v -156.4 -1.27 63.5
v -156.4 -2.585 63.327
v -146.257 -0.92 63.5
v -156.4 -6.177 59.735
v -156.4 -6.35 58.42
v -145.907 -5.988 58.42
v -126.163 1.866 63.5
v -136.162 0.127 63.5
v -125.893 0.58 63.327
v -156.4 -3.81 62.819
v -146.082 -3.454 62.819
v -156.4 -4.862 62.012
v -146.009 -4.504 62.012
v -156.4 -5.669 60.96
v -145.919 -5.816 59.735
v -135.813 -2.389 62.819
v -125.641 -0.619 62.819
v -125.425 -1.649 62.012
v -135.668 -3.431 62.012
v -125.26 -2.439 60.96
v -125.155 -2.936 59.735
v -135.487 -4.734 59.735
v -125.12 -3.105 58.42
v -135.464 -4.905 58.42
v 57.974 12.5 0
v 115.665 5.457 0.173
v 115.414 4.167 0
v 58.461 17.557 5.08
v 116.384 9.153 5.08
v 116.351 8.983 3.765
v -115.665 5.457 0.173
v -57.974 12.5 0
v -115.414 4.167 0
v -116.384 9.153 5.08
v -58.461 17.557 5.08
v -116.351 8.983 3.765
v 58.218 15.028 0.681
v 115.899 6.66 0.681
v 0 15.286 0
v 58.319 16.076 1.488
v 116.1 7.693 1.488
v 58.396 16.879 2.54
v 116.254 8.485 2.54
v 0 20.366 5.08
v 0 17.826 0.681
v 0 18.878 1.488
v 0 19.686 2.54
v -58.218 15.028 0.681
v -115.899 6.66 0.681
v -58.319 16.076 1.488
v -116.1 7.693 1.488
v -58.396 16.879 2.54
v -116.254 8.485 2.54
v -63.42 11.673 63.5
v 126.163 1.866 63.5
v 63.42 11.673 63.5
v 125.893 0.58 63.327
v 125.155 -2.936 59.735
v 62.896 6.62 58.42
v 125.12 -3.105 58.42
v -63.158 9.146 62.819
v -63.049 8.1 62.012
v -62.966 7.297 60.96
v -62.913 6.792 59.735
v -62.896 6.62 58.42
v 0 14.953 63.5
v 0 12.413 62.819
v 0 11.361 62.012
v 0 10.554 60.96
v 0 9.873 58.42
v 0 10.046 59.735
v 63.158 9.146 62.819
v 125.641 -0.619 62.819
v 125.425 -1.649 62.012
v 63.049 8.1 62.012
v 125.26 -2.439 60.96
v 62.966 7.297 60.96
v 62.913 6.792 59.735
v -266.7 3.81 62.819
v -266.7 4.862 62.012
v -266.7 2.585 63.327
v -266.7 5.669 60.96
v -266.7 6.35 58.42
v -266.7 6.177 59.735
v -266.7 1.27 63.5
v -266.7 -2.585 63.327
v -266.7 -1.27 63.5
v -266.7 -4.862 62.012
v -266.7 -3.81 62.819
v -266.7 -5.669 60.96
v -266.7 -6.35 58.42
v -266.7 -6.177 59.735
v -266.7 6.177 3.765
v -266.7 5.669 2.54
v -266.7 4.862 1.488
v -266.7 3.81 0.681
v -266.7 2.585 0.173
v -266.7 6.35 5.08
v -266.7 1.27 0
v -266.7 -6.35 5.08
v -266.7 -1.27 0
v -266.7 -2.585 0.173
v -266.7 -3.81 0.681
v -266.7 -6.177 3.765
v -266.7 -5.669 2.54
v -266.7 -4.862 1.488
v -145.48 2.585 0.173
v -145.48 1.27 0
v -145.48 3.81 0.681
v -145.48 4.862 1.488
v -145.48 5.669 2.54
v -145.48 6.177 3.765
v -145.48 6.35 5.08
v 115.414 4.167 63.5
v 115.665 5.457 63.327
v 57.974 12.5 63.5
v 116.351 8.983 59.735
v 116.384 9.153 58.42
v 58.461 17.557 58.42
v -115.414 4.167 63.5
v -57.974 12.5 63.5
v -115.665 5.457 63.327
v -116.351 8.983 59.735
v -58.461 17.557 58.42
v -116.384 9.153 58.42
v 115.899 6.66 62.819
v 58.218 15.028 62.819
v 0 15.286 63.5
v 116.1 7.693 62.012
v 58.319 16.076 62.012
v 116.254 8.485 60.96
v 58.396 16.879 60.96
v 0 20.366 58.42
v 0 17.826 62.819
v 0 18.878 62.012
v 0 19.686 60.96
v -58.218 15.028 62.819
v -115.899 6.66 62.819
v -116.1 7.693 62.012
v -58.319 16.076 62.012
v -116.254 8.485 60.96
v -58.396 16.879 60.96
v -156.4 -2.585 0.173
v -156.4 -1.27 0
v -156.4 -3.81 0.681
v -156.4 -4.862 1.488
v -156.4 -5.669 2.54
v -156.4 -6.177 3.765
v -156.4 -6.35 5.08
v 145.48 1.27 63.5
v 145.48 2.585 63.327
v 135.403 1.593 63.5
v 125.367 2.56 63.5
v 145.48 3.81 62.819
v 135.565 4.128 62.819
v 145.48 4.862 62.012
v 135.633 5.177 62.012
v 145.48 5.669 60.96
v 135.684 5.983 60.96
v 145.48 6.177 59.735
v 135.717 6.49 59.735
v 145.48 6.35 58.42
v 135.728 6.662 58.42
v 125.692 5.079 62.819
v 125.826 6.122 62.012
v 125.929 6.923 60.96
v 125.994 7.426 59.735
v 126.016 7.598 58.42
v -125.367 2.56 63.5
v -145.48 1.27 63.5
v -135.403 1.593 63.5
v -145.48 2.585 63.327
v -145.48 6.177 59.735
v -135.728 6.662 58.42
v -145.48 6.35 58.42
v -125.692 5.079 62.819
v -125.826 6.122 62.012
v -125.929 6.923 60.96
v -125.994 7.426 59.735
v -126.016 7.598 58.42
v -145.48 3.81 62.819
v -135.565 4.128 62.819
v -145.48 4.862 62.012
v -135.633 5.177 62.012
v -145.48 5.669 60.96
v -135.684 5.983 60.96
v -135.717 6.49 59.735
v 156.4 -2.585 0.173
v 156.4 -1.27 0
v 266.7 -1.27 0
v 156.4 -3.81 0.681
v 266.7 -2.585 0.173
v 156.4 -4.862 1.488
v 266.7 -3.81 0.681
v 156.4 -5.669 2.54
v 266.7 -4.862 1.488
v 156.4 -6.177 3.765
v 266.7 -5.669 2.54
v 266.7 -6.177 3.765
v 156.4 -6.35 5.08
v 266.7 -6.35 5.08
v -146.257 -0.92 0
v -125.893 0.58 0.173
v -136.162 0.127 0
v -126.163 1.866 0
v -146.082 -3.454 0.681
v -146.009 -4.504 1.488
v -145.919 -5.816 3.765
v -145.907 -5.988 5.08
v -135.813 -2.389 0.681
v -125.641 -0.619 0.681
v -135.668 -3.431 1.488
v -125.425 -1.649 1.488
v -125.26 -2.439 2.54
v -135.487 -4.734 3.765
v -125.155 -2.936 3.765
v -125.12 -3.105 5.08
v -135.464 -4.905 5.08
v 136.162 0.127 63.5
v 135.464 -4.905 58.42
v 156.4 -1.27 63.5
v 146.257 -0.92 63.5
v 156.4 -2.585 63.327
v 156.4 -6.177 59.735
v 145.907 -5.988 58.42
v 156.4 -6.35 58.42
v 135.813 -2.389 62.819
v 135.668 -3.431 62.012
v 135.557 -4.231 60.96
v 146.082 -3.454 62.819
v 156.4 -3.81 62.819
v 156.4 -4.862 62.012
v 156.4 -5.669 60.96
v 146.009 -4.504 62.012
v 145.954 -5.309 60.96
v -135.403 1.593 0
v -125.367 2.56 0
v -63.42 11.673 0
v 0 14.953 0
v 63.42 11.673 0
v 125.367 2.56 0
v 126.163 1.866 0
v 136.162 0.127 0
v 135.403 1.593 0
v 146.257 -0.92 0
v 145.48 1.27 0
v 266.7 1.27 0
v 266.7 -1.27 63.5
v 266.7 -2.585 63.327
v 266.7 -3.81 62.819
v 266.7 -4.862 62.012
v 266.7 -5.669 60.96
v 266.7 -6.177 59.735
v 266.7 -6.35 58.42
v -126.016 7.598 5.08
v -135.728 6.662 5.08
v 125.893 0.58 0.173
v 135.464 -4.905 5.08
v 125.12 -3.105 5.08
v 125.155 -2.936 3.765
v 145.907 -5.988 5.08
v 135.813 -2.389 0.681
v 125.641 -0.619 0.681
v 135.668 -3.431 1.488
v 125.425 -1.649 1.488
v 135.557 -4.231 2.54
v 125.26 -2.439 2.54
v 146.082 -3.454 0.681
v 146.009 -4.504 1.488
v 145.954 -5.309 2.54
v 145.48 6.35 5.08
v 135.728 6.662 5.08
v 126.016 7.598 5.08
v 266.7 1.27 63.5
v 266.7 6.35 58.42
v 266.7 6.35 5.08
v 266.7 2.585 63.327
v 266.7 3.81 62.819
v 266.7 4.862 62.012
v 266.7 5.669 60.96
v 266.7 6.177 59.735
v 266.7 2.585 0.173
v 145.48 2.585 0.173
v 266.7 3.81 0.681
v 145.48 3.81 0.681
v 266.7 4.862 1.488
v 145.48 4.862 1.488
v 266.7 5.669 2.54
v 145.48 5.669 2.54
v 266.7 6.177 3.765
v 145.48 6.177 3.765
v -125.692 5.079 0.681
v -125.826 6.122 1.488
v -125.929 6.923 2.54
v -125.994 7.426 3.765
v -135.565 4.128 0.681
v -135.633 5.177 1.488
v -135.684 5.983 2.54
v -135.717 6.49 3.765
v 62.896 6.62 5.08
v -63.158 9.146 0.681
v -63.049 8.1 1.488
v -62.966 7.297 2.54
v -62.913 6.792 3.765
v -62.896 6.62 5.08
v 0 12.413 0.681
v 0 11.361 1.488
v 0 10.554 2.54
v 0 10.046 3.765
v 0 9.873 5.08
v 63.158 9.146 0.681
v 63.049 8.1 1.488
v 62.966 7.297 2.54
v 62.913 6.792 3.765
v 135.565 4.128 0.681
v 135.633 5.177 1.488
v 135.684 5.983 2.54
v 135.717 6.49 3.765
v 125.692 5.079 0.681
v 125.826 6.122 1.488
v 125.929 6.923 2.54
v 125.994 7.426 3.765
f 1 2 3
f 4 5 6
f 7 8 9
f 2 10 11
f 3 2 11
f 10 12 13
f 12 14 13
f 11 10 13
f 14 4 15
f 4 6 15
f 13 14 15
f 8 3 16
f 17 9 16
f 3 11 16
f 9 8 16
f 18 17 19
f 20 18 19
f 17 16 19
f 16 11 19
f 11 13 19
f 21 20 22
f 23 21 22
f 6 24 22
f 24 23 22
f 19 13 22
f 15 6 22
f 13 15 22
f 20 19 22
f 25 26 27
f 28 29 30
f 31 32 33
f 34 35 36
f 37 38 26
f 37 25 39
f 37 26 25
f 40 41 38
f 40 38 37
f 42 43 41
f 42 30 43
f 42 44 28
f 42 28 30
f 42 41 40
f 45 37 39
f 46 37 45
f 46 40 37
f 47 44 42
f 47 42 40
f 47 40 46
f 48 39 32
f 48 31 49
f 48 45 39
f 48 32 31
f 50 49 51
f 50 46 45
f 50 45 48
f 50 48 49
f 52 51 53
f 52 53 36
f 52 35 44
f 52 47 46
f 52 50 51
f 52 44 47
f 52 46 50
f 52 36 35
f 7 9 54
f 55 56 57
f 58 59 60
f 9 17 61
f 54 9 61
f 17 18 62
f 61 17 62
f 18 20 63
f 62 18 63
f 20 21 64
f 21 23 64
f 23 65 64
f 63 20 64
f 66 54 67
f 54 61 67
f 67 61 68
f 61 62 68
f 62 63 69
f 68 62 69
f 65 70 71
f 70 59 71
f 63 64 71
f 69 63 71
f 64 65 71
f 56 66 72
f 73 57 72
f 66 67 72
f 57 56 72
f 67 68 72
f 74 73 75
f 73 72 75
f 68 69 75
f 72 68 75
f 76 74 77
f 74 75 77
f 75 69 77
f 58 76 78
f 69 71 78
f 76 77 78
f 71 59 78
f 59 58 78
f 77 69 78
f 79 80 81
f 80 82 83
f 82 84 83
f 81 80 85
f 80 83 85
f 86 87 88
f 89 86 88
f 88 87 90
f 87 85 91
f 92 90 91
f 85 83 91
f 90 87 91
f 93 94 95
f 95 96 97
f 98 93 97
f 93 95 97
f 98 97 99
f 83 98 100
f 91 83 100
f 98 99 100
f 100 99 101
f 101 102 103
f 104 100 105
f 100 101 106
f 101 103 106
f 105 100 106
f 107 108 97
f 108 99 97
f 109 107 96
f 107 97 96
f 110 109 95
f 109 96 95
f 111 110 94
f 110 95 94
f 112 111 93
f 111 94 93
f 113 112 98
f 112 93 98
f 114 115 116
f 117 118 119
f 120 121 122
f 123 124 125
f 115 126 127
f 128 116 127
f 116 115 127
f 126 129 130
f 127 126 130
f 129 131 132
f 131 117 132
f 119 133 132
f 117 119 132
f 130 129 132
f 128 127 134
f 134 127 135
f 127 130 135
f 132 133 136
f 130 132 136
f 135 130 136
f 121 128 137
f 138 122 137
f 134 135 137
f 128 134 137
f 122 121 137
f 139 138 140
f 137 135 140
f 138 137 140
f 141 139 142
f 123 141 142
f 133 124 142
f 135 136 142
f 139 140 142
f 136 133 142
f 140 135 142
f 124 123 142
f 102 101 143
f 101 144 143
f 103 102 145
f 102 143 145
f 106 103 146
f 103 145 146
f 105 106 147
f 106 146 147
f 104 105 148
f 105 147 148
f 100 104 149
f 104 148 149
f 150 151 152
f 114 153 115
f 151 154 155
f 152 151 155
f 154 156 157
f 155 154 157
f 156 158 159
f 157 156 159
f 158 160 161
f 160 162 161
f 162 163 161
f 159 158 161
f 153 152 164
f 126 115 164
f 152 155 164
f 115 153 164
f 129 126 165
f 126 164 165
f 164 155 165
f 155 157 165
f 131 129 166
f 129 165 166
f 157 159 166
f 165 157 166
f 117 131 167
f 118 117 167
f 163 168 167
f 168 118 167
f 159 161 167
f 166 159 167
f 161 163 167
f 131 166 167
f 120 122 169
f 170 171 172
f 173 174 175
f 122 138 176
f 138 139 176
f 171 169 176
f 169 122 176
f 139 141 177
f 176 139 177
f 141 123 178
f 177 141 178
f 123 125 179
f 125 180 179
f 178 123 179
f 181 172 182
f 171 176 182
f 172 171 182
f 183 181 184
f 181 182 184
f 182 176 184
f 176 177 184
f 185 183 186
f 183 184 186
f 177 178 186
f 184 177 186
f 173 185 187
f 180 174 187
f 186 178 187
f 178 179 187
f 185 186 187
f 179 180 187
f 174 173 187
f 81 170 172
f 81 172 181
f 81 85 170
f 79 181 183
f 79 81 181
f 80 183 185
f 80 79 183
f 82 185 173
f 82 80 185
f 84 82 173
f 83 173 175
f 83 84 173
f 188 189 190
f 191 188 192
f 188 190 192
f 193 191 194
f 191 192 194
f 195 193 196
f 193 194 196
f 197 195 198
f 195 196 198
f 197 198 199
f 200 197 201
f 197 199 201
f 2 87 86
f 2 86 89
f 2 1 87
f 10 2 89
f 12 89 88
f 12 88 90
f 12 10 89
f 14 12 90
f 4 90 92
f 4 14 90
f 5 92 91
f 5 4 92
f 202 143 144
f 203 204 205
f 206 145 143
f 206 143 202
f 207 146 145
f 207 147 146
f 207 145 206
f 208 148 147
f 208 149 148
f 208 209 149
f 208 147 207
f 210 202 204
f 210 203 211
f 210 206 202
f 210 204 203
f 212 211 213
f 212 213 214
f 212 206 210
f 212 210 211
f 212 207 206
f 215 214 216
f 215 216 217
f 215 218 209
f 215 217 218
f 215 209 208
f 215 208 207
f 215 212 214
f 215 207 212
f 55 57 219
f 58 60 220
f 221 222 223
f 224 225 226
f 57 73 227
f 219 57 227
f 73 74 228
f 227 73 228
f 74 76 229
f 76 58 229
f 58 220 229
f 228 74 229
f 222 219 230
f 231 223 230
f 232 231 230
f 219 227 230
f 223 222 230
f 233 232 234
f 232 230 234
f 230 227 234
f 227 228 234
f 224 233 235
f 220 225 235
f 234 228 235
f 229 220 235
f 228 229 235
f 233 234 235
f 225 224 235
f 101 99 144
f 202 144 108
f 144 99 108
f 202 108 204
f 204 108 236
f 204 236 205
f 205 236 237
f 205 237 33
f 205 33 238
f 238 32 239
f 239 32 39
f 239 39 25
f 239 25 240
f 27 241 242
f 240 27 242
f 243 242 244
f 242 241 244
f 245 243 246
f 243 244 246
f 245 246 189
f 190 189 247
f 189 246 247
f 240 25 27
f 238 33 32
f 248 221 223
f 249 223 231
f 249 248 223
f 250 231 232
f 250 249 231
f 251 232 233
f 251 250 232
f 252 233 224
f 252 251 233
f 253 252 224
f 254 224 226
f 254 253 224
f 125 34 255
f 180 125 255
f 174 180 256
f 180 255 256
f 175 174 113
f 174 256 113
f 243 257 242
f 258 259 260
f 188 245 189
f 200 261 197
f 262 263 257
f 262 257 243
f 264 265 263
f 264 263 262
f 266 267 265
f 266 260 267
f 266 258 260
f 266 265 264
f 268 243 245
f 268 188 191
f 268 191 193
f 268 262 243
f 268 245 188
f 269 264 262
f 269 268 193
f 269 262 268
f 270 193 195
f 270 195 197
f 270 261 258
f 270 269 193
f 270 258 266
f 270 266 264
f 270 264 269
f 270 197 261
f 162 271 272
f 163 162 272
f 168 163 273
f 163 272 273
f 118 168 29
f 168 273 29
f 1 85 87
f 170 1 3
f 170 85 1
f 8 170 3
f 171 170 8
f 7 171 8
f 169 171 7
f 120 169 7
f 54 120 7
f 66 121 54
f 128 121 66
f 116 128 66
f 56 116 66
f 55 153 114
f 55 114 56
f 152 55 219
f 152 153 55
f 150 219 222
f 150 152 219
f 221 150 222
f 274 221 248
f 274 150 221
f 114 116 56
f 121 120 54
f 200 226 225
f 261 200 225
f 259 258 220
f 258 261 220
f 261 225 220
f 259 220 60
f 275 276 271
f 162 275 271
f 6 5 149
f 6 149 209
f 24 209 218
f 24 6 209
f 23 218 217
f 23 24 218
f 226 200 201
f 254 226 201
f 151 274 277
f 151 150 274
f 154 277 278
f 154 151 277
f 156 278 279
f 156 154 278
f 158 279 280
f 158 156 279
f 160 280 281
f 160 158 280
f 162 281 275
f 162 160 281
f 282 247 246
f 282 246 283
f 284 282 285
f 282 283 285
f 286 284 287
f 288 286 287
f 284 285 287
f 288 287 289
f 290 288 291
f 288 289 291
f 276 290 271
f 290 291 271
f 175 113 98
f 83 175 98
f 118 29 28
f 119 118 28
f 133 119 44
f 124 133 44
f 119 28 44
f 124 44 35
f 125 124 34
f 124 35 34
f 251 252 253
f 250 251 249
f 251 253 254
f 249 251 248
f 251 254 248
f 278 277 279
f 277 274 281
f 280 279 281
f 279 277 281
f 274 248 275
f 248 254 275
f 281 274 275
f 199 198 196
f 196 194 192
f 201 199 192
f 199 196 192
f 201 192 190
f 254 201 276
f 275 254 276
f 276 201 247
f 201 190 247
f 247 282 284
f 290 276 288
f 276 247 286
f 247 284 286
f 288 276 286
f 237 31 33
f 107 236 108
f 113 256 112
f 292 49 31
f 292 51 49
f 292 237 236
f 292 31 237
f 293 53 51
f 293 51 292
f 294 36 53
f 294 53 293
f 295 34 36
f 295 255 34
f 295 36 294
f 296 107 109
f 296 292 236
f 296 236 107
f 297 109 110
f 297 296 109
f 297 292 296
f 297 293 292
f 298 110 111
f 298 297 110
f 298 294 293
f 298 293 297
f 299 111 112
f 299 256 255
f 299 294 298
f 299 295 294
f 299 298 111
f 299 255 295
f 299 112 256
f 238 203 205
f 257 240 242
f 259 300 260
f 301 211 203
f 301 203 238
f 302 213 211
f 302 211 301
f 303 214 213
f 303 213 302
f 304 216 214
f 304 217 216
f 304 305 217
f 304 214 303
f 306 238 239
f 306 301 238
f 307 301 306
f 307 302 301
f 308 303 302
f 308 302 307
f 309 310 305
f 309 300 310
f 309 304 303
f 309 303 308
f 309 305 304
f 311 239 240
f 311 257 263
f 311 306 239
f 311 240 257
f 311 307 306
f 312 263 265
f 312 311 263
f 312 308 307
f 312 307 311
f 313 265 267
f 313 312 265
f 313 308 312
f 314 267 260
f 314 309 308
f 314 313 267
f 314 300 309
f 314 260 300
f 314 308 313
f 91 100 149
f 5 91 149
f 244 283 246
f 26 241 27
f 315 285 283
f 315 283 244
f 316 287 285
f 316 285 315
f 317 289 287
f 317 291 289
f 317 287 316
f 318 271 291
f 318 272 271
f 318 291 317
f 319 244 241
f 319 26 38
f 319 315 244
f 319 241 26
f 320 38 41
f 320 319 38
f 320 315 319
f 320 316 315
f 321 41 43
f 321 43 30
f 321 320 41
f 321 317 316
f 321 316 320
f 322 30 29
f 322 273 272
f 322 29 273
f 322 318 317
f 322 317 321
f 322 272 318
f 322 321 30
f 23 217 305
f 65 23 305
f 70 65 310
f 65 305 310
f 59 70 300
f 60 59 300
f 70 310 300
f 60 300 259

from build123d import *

# Parameters (mm, degrees)
F1_DEPTH = 63.5
F2_R     = 152.4
F3_R     = 5.08
F4_R     = 5.08


with BuildPart() as f1:
    # F0 (on Top) → F1 (new body)
    with BuildSketch(Plane.XY):
        with BuildLine():
            Line((139.7, -6.35), (266.7, -6.35))
            Line((266.7, -6.35), (266.7, 6.35))
            Line((266.7, 6.35), (145.47977, 6.35))
            ThreePointArc((145.47977, 6.35), (130.864429, 7.052433), (116.383816, 9.153257))
            ThreePointArc((116.383816, 9.153257), (0, 20.366286), (-116.383816, 9.153257))
            ThreePointArc((-116.383816, 9.153257), (-130.864429, 7.052433), (-145.47977, 6.35))
            Line((-145.47977, 6.35), (-266.7, 6.35))
            Line((-266.7, 6.35), (-266.7, -6.35))
            Line((-266.7, -6.35), (-139.7, -6.35))
            ThreePointArc((-139.7, -6.35), (0, 9.873164), (139.7, -6.35))
        make_face()
    extrude(amount=F1_DEPTH)

    # F2
    f2_edges = [f1.edges().sort_by_distance(p)[0] for p in [
        (139.7, -6.35, 31.75),
        (-139.7, -6.35, 31.75),
    ]]
    fillet(f2_edges, radius=F2_R)

    # F3
    f3_edges = [f1.edges().sort_by_distance(p)[0] for p in [
        (-211.54992, -6.35, 63.5),
        (-206.089885, 6.35, 63.5),
    ]]
    fillet(f3_edges, radius=F3_R)

    # F4
    f4_edges = [f1.edges().sort_by_distance(p)[0] for p in [
        (-206.089885, 6.35, 0),
        (-211.54992, -6.35, 0),
    ]]
    fillet(f4_edges, radius=F4_R)


solid = f1.part
